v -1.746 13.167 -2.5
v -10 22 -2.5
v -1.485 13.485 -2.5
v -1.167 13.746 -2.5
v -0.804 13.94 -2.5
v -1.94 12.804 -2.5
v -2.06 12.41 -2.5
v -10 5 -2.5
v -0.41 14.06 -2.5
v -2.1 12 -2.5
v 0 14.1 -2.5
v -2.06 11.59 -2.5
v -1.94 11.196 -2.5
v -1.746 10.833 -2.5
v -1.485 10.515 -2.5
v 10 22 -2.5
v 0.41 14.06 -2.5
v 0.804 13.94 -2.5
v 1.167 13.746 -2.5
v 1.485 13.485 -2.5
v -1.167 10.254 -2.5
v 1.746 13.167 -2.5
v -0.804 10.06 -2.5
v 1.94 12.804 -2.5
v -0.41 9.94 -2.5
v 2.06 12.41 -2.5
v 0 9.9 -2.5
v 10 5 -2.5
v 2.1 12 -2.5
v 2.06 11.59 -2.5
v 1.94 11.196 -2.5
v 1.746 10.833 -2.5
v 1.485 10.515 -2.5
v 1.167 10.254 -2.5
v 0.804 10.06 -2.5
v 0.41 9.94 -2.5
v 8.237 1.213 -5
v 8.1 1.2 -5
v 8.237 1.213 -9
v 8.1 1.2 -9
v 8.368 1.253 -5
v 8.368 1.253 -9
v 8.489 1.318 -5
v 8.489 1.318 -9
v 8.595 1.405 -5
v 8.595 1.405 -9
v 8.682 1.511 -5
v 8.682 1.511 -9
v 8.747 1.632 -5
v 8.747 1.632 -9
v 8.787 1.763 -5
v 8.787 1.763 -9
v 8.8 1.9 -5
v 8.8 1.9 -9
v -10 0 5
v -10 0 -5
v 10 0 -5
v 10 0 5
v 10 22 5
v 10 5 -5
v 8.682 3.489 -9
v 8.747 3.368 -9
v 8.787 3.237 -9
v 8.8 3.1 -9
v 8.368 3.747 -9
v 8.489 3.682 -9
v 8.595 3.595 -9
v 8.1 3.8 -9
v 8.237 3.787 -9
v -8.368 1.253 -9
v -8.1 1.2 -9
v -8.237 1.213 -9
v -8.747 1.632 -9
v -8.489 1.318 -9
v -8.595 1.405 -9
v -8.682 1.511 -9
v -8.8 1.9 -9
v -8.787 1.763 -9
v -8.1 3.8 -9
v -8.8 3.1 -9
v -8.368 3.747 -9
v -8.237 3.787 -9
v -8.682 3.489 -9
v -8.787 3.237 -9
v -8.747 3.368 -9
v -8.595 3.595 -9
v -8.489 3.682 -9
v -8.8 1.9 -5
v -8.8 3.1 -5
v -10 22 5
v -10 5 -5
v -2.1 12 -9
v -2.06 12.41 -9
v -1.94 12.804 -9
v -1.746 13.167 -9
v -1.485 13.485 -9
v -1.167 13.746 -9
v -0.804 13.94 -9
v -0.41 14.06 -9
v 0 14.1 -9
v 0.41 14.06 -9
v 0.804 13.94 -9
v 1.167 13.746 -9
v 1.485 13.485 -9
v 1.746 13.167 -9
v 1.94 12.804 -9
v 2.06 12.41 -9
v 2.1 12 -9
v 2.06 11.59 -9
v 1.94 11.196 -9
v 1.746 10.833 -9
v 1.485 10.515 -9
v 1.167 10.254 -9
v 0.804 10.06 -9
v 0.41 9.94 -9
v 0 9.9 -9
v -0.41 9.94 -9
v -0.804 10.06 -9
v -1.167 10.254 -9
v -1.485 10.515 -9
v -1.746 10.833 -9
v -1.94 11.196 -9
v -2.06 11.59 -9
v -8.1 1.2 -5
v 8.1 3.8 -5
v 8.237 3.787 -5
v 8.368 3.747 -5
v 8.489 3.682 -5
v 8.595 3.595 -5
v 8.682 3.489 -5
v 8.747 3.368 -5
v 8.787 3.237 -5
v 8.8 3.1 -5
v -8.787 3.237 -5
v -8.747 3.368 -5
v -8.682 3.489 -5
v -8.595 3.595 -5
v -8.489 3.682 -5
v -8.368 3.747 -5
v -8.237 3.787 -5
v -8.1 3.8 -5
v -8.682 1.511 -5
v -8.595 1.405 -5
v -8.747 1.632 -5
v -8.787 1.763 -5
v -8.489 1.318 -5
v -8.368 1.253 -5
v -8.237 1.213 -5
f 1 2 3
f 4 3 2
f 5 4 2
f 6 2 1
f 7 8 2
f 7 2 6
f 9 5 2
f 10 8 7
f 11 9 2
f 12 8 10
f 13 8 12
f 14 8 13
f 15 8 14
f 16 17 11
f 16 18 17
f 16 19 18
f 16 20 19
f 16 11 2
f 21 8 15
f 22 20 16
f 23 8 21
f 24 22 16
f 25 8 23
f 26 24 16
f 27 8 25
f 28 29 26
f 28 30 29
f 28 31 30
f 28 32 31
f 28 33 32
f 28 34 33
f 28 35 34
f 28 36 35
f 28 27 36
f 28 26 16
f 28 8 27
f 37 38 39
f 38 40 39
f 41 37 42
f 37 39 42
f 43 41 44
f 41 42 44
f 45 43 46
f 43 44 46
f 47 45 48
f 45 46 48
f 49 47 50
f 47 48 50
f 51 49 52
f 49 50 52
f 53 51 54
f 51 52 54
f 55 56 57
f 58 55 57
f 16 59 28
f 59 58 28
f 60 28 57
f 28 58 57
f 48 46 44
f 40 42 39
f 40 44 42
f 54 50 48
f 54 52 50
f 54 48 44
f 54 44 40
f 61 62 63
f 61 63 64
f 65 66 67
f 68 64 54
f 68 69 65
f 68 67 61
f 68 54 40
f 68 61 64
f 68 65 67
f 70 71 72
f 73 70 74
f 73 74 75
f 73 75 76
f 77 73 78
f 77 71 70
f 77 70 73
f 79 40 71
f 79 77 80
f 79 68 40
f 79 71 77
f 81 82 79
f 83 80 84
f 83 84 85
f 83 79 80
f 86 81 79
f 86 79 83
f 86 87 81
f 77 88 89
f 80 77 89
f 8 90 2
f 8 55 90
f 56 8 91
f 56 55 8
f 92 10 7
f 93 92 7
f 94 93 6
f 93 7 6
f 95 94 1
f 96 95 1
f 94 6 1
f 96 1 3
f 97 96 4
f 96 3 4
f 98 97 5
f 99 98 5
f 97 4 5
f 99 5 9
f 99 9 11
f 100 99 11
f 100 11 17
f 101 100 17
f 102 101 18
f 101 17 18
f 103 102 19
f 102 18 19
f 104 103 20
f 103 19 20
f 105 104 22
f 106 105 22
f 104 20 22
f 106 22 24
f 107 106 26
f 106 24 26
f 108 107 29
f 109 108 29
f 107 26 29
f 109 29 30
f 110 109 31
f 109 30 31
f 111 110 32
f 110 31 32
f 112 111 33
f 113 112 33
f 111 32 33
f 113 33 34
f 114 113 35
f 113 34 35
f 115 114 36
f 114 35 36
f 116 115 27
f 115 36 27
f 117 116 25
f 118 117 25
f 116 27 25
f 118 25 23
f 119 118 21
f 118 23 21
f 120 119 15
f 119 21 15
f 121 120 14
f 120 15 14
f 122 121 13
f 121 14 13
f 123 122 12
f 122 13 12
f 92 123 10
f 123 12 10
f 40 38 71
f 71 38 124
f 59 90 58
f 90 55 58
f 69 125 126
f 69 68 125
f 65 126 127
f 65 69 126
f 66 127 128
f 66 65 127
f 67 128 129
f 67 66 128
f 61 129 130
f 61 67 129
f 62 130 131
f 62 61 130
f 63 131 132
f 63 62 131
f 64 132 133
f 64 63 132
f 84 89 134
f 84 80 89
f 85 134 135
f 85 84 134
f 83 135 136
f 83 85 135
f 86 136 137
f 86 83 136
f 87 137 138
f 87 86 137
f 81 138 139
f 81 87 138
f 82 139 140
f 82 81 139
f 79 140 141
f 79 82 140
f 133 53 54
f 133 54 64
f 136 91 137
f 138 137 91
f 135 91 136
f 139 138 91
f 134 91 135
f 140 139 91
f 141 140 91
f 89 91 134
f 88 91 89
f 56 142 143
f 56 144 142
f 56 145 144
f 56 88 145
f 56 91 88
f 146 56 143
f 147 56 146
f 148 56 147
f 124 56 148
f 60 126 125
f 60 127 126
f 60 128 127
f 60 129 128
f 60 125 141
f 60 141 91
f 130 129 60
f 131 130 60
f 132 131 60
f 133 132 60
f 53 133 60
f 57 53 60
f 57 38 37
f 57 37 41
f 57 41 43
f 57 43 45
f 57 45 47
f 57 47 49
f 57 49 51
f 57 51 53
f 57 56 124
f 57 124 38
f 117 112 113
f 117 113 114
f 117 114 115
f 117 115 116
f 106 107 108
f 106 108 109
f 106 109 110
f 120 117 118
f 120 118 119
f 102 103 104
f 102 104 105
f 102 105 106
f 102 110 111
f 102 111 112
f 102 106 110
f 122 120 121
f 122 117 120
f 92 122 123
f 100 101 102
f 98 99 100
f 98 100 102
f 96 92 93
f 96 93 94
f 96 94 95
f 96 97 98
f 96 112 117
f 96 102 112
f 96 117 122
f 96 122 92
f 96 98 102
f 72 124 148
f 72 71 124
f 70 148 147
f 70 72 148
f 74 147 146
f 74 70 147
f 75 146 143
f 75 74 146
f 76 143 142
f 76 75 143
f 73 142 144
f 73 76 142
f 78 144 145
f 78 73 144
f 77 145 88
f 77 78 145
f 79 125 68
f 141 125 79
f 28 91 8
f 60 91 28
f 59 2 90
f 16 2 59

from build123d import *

# Parameters (mm, degrees)
SKETCH1_W           = 20
SKETCH1_H           = 10
BOSS_EXTRUDE1_DEPTH = 5
SKETCH2_W           = 17.6
SKETCH2_H           = 2.6
BOSS_EXTRUDE2_DEPTH = 4
FILLET1_R           = 0.7
SKETCH3_W           = 20
SKETCH3_H           = 7.5
BOSS_EXTRUDE3_DEPTH = 17
SKETCH4_R           = 2.1
BOSS_EXTRUDE4_DEPTH = 6.5


with BuildPart() as part:
    # Sketch1 → Boss-Extrude1 (new body)
    with BuildSketch(Plane(origin=(0, 0, 0), x_dir=(1, 0, 0), z_dir=(0, 1, 0))):
        Rectangle(SKETCH1_W, SKETCH1_H)
    extrude(amount=BOSS_EXTRUDE1_DEPTH)

    # Sketch2 → Boss-Extrude2 (add)
    with BuildSketch(Plane(origin=(0, 0, -5), x_dir=(-1, 0, 0), z_dir=(0, 0, -1))):
        with Locations((0, 2.5)):
            Rectangle(SKETCH2_W, SKETCH2_H)
    extrude(amount=BOSS_EXTRUDE2_DEPTH)

    # Fillet1
    fillet1_edges = [part.edges().sort_by_distance(p)[0] for p in [
        (-8.8, 1.2, -7),
        (-8.8, 3.8, -7),
        (8.8, 3.8, -7),
        (8.8, 1.2, -7),
    ]]
    fillet(fillet1_edges, radius=FILLET1_R)

    # Sketch3 → Boss-Extrude3 (add)
    with BuildSketch(Plane(origin=(0, 5, 0), x_dir=(1, 0, 0), z_dir=(0, 1, 0))):
        with Locations((0, -1.25)):
            Rectangle(SKETCH3_W, SKETCH3_H)
    extrude(amount=BOSS_EXTRUDE3_DEPTH)

    # Sketch4 → Boss-Extrude4 (add)
    with BuildSketch(Plane(origin=(0, 0, -2.5), x_dir=(-1, 0, 0), z_dir=(0, 0, -1))):
        with Locations((0, 12)):
            Circle(SKETCH4_R)
    extrude(amount=BOSS_EXTRUDE4_DEPTH)


solid = part.part
